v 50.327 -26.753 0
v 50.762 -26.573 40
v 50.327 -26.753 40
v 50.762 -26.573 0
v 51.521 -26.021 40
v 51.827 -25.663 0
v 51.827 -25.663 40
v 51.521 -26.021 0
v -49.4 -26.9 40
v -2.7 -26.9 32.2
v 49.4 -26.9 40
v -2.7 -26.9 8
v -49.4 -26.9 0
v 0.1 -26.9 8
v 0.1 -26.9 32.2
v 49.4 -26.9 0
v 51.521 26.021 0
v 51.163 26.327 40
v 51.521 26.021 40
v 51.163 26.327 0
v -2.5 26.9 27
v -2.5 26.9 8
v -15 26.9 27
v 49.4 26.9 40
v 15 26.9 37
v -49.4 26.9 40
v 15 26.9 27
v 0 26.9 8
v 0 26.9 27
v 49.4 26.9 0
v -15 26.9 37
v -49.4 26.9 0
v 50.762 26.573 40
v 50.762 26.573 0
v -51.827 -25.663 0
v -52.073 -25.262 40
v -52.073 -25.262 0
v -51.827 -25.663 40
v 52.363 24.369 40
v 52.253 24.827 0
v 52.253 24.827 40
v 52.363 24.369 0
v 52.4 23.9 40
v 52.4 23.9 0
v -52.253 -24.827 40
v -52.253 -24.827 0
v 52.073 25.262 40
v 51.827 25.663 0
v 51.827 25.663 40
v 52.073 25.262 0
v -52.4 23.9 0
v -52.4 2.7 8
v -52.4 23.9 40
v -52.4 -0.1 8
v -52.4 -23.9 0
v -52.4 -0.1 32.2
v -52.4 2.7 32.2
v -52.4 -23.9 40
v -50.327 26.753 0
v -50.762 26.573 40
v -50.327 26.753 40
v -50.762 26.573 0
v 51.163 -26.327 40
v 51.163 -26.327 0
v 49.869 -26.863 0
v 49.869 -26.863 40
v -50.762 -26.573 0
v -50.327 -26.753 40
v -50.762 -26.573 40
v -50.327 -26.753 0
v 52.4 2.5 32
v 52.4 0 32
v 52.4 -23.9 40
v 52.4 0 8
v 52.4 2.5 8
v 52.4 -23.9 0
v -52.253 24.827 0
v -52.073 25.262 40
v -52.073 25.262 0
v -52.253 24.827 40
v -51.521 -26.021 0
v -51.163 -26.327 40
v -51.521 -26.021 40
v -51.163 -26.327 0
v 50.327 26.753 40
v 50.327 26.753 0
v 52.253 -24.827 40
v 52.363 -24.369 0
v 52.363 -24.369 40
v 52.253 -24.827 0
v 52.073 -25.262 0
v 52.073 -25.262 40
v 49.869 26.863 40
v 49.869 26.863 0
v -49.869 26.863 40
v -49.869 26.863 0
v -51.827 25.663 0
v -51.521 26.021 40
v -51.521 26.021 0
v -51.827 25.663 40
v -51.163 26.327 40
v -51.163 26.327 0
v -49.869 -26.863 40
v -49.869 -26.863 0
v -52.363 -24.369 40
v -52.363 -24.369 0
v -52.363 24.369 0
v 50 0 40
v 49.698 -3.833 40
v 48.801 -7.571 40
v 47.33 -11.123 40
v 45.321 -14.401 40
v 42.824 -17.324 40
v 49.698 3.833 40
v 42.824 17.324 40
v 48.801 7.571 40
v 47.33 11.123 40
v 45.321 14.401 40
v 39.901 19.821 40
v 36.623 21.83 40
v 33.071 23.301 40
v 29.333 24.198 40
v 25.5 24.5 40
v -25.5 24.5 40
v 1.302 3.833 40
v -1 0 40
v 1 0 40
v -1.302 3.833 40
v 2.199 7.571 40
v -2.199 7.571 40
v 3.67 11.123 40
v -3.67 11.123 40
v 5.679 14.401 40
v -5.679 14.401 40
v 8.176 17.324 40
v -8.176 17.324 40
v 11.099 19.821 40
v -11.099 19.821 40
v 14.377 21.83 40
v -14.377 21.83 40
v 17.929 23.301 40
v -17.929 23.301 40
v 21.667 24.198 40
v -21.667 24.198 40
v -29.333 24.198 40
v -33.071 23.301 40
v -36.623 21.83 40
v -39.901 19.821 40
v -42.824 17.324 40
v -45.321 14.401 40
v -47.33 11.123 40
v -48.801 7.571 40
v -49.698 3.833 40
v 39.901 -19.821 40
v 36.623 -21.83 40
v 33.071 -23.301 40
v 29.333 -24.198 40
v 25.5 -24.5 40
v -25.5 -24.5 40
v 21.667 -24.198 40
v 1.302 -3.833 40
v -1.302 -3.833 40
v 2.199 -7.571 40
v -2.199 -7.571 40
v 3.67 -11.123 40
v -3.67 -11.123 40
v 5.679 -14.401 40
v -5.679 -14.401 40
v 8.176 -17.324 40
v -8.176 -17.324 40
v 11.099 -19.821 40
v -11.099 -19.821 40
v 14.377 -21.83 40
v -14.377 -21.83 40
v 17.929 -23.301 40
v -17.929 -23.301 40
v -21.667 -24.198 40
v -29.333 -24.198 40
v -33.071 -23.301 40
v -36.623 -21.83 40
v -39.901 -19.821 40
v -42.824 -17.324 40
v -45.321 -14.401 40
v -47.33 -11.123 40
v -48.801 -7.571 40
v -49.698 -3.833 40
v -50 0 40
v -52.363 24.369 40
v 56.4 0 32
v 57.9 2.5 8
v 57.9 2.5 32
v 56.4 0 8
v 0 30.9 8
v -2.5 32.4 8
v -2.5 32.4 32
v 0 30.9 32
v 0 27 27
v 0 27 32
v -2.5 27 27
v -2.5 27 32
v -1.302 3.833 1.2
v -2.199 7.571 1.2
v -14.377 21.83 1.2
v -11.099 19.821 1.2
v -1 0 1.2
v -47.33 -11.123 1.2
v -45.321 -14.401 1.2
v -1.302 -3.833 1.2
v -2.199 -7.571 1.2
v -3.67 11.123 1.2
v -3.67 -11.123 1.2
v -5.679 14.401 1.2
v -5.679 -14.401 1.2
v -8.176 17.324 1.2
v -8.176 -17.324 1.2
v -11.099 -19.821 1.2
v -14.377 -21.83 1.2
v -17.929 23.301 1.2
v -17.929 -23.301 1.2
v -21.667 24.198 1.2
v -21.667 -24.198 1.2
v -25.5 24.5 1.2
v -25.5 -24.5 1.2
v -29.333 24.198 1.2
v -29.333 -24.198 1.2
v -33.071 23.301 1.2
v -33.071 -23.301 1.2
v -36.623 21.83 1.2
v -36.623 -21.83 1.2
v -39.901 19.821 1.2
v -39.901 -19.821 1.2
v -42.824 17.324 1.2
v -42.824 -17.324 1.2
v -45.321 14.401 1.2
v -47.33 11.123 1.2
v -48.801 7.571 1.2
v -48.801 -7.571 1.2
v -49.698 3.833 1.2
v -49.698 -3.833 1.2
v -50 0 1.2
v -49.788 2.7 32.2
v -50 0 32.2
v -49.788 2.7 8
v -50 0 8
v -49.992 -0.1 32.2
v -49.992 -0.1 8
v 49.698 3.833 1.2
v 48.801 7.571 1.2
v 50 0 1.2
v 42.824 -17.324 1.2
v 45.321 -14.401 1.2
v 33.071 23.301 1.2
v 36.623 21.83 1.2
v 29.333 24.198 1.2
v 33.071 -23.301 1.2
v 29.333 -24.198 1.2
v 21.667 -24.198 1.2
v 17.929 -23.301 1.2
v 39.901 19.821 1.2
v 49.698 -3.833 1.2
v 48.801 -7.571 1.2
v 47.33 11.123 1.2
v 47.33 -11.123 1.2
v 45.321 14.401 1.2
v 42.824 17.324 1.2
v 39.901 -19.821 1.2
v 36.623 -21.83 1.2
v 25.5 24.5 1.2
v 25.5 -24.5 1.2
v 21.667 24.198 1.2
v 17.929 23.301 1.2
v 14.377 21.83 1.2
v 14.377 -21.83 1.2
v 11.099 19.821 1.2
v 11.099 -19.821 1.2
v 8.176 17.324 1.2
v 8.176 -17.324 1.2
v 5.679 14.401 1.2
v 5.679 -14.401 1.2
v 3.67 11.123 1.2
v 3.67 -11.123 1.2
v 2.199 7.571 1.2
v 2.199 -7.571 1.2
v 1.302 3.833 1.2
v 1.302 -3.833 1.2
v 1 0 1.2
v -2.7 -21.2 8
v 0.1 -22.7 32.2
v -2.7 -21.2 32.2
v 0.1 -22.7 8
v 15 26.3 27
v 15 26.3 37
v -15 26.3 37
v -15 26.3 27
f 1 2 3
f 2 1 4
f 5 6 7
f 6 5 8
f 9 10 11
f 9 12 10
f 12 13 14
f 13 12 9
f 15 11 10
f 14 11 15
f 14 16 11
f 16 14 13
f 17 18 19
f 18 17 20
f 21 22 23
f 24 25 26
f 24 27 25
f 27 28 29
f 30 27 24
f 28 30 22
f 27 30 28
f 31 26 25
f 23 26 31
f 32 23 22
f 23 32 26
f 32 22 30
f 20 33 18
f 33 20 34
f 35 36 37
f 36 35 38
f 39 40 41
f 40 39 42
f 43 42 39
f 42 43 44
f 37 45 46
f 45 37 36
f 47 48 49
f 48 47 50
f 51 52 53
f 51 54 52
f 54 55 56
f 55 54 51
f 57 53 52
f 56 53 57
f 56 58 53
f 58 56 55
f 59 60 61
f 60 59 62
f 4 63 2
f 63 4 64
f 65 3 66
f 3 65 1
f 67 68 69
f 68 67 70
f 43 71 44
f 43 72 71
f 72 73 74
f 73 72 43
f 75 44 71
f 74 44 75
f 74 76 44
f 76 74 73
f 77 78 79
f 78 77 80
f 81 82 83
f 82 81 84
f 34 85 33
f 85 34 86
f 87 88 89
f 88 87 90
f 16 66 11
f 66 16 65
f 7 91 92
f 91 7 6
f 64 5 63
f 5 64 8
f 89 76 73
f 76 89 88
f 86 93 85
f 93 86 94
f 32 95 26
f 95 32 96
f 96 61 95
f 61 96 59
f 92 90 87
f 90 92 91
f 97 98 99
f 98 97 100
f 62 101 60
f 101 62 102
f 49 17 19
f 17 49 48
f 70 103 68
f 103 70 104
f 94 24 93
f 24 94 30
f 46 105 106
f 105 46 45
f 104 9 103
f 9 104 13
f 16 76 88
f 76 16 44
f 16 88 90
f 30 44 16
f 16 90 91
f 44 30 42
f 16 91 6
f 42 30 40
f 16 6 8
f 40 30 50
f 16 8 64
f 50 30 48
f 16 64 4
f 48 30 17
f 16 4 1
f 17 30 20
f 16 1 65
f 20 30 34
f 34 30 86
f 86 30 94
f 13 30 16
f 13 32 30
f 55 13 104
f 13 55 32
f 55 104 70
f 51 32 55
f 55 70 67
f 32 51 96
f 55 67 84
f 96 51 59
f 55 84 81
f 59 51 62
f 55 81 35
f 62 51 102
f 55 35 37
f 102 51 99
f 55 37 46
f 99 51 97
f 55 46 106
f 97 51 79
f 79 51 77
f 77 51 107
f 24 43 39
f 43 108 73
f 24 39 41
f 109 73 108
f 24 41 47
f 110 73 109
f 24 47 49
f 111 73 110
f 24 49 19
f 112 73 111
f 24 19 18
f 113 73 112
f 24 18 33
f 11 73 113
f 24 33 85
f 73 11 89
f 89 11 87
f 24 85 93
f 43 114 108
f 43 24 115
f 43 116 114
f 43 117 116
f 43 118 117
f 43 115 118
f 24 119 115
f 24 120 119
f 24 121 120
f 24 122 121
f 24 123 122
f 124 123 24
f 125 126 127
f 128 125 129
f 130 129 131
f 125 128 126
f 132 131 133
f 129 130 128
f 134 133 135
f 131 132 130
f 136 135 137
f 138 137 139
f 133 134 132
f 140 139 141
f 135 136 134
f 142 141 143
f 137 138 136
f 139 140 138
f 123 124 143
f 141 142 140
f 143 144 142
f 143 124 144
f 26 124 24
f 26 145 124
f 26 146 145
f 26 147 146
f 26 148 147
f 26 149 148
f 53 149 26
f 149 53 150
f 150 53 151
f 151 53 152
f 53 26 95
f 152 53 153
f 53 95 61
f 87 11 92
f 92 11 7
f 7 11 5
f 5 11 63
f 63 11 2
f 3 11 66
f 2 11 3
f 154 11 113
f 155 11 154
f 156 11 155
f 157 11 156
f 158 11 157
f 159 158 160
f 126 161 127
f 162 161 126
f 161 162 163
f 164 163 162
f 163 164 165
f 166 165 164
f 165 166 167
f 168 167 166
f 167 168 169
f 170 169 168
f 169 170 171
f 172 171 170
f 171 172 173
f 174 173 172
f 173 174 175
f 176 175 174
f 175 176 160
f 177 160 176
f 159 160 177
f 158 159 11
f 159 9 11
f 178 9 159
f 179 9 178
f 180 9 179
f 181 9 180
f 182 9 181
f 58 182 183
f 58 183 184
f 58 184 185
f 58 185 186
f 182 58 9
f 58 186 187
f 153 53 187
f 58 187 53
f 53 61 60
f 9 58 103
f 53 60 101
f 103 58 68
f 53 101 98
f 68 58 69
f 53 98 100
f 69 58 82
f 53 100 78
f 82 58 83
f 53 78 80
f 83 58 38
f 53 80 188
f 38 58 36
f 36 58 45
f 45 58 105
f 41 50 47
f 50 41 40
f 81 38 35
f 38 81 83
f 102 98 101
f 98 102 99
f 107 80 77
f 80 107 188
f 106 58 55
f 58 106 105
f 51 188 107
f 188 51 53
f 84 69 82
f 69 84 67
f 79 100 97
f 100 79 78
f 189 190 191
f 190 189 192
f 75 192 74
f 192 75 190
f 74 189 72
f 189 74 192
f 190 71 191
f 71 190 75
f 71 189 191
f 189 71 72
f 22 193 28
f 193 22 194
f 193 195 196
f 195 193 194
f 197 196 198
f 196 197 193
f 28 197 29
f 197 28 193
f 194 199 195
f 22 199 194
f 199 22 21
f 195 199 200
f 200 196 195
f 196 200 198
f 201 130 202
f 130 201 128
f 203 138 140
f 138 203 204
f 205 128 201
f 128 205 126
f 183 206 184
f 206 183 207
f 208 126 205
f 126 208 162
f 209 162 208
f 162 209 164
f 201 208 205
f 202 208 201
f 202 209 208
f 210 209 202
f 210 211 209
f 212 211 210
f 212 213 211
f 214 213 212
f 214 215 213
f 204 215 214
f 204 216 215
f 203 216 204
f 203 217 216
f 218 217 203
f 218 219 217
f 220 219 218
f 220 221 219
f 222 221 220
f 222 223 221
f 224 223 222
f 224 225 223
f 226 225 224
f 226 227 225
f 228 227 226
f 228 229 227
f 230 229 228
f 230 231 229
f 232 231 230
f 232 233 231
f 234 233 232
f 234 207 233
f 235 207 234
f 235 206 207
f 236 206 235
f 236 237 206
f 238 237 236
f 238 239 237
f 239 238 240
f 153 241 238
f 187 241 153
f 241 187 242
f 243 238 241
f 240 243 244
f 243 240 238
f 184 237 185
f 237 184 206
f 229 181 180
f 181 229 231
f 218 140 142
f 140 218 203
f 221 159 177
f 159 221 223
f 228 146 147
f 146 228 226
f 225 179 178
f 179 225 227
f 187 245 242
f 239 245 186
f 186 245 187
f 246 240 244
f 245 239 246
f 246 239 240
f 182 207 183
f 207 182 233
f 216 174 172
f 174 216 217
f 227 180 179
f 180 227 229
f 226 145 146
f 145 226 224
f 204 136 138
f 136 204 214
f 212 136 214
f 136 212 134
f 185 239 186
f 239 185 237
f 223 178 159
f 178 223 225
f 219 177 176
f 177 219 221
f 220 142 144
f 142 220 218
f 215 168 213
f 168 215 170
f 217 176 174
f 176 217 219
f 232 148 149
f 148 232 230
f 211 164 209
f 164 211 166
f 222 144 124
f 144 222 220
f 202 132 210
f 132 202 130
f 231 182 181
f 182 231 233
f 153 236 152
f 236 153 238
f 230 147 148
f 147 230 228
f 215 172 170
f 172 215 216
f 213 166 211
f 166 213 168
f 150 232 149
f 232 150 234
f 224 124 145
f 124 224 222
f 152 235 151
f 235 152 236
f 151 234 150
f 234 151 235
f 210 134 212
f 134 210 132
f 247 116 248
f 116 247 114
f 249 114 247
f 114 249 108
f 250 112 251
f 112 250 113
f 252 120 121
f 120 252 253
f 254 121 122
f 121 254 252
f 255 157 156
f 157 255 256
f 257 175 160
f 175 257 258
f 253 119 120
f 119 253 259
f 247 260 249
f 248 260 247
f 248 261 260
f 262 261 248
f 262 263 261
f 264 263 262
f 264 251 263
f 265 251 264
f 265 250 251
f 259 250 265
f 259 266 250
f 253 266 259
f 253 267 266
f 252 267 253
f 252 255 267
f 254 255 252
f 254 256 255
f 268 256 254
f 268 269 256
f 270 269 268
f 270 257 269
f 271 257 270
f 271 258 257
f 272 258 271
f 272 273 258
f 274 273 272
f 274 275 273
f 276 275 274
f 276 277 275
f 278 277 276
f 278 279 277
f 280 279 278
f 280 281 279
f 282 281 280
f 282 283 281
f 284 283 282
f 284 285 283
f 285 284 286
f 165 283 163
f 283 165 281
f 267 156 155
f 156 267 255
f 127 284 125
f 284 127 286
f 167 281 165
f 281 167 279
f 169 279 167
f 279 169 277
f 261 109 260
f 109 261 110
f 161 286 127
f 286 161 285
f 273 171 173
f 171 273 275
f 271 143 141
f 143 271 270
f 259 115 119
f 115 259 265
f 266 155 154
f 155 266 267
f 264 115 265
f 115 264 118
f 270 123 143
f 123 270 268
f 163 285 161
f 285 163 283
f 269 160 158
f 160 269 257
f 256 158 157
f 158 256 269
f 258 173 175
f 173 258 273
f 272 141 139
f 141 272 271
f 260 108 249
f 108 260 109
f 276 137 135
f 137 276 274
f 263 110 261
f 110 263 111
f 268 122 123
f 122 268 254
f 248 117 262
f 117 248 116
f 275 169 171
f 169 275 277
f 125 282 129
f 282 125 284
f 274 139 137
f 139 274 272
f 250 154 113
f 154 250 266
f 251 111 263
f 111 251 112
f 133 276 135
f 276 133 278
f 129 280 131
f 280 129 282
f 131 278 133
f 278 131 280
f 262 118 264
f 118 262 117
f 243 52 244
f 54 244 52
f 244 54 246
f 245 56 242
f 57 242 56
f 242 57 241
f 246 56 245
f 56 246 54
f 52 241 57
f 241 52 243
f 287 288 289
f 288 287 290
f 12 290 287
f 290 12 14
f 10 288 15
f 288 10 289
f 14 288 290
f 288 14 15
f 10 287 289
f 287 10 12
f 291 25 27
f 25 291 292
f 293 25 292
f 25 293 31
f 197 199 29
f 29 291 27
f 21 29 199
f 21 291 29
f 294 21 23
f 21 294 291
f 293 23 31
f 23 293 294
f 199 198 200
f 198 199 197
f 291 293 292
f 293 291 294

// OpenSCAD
// ============================================================
// Brand-Specific Spice Drawer Organizer — Modular System
// Version: 1.0
// License: Proprietary — STL for sale, .scad source retained
// ============================================================
//
// A modular, snap-together spice drawer organizer with brand-
// specific jar slot geometry. Each module holds 2 jars and
// snaps to adjacent modules in both X and Y directions.
//
// The system works like this:
//   1. Buyer selects their spice jar brand (preset)
//   2. Buyer enters drawer width and depth
//   3. OpenSCAD calculates how many modules fit
//   4. Buyer prints (or we print) the exact quantity needed
//
// Each module is small enough to fit on a 200x200mm bed.
// Modules snap together with dovetail joints on all 4 sides.

// ===================== BRAND PRESETS =========================
// Uncomment ONE preset to set jar slot dimensions.
// All measurements in mm.

// --- McCormick (Standard US grocery, round) ---
// Most common US brand. Small round jars.
jar_dia = 46;        // 1.81" = 46mm
jar_shape = "round"; // round slot
jar_height = 108;    // 4.25" — for reference, not used in 2D layout
brand_name = "McCormick";

// --- Trader Joe's (Rectangular jars) ---
// jar_dia = 46;         // Width: 1.8" = 46mm
// jar_depth = 46;       // Depth: 1.8" = 46mm (nearly square footprint)
// jar_shape = "rect";   // rectangular slot
// jar_height = 104;     // 4.1"
// brand_name = "TraderJoes";

// --- Simply Organic (French square glass) ---
// jar_dia = 52;         // 2.05" = 52mm
// jar_shape = "square"; // square slot
// jar_height = 114;     // 4.5"
// brand_name = "SimplyOrganic";

// --- Whole Foods 365 (Round, standard) ---
// jar_dia = 50;         // ~1.95" = 50mm (avg across product line)
// jar_shape = "round";
// jar_height = 106;     // ~4.15"
// brand_name = "WholeFoods365";

// --- Penzeys (Round, premium) ---
// jar_dia = 52;         // ~2.05" = 52mm
// jar_shape = "round";
// jar_height = 127;     // ~5.0"
// brand_name = "Penzeys";

// --- Custom ---
// jar_dia = YOUR_DIAMETER;
// jar_shape = "round"; // or "rect" or "square"
// jar_height = YOUR_HEIGHT;
// brand_name = "Custom";

// For rectangular jars (Trader Joe's), set jar_depth separately:
jar_depth = jar_dia; // Default: same as diameter (square footprint)

// ===================== DRAWER DIMENSIONS =====================
// Set your drawer interior dimensions here.

drawer_width = 380;   // Interior width in mm (example: 15")
drawer_depth = 457;   // Interior depth in mm (example: 18")
drawer_height = 70;   // Interior height in mm (minimum clearance)

// ===================== MODULE PARAMETERS =====================

// Module sizing (each module holds 2 jars side by side)
wall_thickness = 2.0;     // Wall between jar slots
outer_wall = 2.4;         // Outer wall of module
slot_clearance = 1.5;     // Extra mm around jar for easy insertion/removal
module_height = 40;       // Height of organizer walls (shorter than jars)
base_thickness = 1.2;     // Bottom of each module

// Snap-fit dovetail joint
dovetail_width = 8;       // Width of dovetail tab
dovetail_depth = 2.5;     // How far the dovetail protrudes
dovetail_taper = 1.5;     // Taper on each side for snap engagement
dovetail_tolerance = 0.2; // Clearance for fit

// Corner radius
corner_r = 3;

// Label area
label_recess_depth = 0.6; // Shallow recess on front face for label sticker
label_width = 30;
label_height = 10;

// Resolution
$fn = 40;

// ===================== DERIVED VALUES ========================

// Slot dimensions including clearance
slot_w = jar_dia + slot_clearance * 2;
slot_d = (jar_shape == "rect" || jar_shape == "square")
    ? jar_depth + slot_clearance * 2
    : jar_dia + slot_clearance * 2;

// Module exterior dimensions (2 jars wide, 1 jar deep)
module_width = slot_w * 2 + wall_thickness + outer_wall * 2;
module_depth = slot_d + outer_wall * 2;

// How many modules fit in the drawer
modules_x = floor(drawer_width / module_width);
modules_y = floor(drawer_depth / module_depth);
total_modules = modules_x * modules_y;
total_jars = total_modules * 2;

// ===================== MODULES ===============================

// 2D jar slot shape
module jar_slot_2d() {
    if (jar_shape == "round") {
        circle(d = slot_w);
    } else if (jar_shape == "rect" || jar_shape == "square") {
        offset(r = corner_r) offset(r = -corner_r)
            square([slot_w, slot_d], center = true);
    }
}

// Dovetail tab (male — protrudes from module edge)
module dovetail_tab() {
    w1 = dovetail_width;
    w2 = dovetail_width + dovetail_taper * 2;
    linear_extrude(module_height * 0.6)
        polygon([
            [-w1/2, 0],
            [w1/2, 0],
            [w2/2, dovetail_depth],
            [-w2/2, dovetail_depth]
        ]);
}

// Dovetail socket (female — cut into module edge)
module dovetail_socket() {
    w1 = dovetail_width + dovetail_tolerance * 2;
    w2 = dovetail_width + dovetail_taper * 2 + dovetail_tolerance * 2;
    d = dovetail_depth + dovetail_tolerance;
    linear_extrude(module_height * 0.6 + dovetail_tolerance)
        polygon([
            [-w1/2, 0.1],
            [w1/2, 0.1],
            [w2/2, -d],
            [-w2/2, -d]
        ]);
}

// Single organizer module (holds 2 jars)
module organizer_module() {
    difference() {
        union() {
            // Main body — rounded rectangle
            linear_extrude(module_height)
                offset(r = corner_r) offset(r = -corner_r)
                    square([module_width, module_depth], center = true);

            // Dovetail tabs on +X and +Y faces
            // Right face (+X)
            translate([module_width/2, 0, module_height * 0.2])
                rotate([0, 0, 0])
                    dovetail_tab();
            // Front face (+Y)
            translate([0, module_depth/2, module_height * 0.2])
                rotate([0, 0, 90])
                    dovetail_tab();
        }

        // Jar slot 1 (left)
        slot_offset_x = -(slot_w/2 + wall_thickness/2);
        translate([slot_offset_x, 0, base_thickness])
            linear_extrude(module_height + 1)
                jar_slot_2d();

        // Jar slot 2 (right)
        translate([-slot_offset_x, 0, base_thickness])
            linear_extrude(module_height + 1)
                jar_slot_2d();

        // Dovetail sockets on -X and -Y faces
        // Left face (-X)
        translate([-module_width/2, 0, module_height * 0.2])
            rotate([0, 0, 180])
                dovetail_socket();
        // Back face (-Y)
        translate([0, -module_depth/2, module_height * 0.2])
            rotate([0, 0, -90])
                dovetail_socket();

        // Label recess on front face (for sticker labels)
        translate([-label_width/2, module_depth/2 - label_recess_depth,
                   module_height - label_height - 3])
            cube([label_width, label_recess_depth + 0.1, label_height]);
    }
}

// ===================== ASSEMBLY PREVIEW =======================

// Render a single module (for printing)
organizer_module();

// Uncomment below to preview a 3x2 grid assembly:
// for (ix = [0 : 2])
//     for (iy = [0 : 1])
//         translate([ix * module_width, iy * module_depth, 0])
//             organizer_module();

// ===================== INFO OUTPUT ============================

echo(str("=== SPICE DRAWER ORGANIZER CONFIGURATION ==="));
echo(str("Brand: ", brand_name));
echo(str("Jar slot: ", jar_shape, " ", slot_w, "mm"));
echo(str("Module size: ", module_width, "mm x ", module_depth, "mm"));
echo(str("Drawer: ", drawer_width, "mm x ", drawer_depth, "mm"));
echo(str("Modules that fit: ", modules_x, " x ", modules_y,
         " = ", total_modules, " modules"));
echo(str("Total jar capacity: ", total_jars, " jars"));
echo(str("Remaining space X: ",
         drawer_width - modules_x * module_width, "mm"));
echo(str("Remaining space Y: ",
         drawer_depth - modules_y * module_depth, "mm"));

// ===================== PRINT NOTES ===========================
//
// Print each module individually. They snap together after printing.
//
// ORIENTATION: Print flat, base on the build plate. No supports needed.
//
// MATERIAL: PETG strongly recommended for kitchen use.
//   - Heat resistant (won't warp near stove/oven)
//   - Moisture resistant (won't degrade from spills)
//   - Food-adjacent safe (doesn't contact food directly)
//
// Each module prints in ~25–35 minutes at 0.2mm layer height.
// A full 15"x18" drawer requires ~30 modules = ~15 hours total.
// (Can be batched — 4-6 modules per plate on a 256x256mm bed.)
//
// ASSEMBLY: Snap modules together by pressing dovetail tabs into
// sockets. Modules lock in both X and Y directions. To disassemble,
// flex slightly and pull apart.
//
// BRAND MIXING: Need McCormick AND Trader Joe's in the same drawer?
// Print some modules with each preset. They're all the same exterior
// dimensions — they snap together regardless of which brand preset
// was used for the jar slots.
